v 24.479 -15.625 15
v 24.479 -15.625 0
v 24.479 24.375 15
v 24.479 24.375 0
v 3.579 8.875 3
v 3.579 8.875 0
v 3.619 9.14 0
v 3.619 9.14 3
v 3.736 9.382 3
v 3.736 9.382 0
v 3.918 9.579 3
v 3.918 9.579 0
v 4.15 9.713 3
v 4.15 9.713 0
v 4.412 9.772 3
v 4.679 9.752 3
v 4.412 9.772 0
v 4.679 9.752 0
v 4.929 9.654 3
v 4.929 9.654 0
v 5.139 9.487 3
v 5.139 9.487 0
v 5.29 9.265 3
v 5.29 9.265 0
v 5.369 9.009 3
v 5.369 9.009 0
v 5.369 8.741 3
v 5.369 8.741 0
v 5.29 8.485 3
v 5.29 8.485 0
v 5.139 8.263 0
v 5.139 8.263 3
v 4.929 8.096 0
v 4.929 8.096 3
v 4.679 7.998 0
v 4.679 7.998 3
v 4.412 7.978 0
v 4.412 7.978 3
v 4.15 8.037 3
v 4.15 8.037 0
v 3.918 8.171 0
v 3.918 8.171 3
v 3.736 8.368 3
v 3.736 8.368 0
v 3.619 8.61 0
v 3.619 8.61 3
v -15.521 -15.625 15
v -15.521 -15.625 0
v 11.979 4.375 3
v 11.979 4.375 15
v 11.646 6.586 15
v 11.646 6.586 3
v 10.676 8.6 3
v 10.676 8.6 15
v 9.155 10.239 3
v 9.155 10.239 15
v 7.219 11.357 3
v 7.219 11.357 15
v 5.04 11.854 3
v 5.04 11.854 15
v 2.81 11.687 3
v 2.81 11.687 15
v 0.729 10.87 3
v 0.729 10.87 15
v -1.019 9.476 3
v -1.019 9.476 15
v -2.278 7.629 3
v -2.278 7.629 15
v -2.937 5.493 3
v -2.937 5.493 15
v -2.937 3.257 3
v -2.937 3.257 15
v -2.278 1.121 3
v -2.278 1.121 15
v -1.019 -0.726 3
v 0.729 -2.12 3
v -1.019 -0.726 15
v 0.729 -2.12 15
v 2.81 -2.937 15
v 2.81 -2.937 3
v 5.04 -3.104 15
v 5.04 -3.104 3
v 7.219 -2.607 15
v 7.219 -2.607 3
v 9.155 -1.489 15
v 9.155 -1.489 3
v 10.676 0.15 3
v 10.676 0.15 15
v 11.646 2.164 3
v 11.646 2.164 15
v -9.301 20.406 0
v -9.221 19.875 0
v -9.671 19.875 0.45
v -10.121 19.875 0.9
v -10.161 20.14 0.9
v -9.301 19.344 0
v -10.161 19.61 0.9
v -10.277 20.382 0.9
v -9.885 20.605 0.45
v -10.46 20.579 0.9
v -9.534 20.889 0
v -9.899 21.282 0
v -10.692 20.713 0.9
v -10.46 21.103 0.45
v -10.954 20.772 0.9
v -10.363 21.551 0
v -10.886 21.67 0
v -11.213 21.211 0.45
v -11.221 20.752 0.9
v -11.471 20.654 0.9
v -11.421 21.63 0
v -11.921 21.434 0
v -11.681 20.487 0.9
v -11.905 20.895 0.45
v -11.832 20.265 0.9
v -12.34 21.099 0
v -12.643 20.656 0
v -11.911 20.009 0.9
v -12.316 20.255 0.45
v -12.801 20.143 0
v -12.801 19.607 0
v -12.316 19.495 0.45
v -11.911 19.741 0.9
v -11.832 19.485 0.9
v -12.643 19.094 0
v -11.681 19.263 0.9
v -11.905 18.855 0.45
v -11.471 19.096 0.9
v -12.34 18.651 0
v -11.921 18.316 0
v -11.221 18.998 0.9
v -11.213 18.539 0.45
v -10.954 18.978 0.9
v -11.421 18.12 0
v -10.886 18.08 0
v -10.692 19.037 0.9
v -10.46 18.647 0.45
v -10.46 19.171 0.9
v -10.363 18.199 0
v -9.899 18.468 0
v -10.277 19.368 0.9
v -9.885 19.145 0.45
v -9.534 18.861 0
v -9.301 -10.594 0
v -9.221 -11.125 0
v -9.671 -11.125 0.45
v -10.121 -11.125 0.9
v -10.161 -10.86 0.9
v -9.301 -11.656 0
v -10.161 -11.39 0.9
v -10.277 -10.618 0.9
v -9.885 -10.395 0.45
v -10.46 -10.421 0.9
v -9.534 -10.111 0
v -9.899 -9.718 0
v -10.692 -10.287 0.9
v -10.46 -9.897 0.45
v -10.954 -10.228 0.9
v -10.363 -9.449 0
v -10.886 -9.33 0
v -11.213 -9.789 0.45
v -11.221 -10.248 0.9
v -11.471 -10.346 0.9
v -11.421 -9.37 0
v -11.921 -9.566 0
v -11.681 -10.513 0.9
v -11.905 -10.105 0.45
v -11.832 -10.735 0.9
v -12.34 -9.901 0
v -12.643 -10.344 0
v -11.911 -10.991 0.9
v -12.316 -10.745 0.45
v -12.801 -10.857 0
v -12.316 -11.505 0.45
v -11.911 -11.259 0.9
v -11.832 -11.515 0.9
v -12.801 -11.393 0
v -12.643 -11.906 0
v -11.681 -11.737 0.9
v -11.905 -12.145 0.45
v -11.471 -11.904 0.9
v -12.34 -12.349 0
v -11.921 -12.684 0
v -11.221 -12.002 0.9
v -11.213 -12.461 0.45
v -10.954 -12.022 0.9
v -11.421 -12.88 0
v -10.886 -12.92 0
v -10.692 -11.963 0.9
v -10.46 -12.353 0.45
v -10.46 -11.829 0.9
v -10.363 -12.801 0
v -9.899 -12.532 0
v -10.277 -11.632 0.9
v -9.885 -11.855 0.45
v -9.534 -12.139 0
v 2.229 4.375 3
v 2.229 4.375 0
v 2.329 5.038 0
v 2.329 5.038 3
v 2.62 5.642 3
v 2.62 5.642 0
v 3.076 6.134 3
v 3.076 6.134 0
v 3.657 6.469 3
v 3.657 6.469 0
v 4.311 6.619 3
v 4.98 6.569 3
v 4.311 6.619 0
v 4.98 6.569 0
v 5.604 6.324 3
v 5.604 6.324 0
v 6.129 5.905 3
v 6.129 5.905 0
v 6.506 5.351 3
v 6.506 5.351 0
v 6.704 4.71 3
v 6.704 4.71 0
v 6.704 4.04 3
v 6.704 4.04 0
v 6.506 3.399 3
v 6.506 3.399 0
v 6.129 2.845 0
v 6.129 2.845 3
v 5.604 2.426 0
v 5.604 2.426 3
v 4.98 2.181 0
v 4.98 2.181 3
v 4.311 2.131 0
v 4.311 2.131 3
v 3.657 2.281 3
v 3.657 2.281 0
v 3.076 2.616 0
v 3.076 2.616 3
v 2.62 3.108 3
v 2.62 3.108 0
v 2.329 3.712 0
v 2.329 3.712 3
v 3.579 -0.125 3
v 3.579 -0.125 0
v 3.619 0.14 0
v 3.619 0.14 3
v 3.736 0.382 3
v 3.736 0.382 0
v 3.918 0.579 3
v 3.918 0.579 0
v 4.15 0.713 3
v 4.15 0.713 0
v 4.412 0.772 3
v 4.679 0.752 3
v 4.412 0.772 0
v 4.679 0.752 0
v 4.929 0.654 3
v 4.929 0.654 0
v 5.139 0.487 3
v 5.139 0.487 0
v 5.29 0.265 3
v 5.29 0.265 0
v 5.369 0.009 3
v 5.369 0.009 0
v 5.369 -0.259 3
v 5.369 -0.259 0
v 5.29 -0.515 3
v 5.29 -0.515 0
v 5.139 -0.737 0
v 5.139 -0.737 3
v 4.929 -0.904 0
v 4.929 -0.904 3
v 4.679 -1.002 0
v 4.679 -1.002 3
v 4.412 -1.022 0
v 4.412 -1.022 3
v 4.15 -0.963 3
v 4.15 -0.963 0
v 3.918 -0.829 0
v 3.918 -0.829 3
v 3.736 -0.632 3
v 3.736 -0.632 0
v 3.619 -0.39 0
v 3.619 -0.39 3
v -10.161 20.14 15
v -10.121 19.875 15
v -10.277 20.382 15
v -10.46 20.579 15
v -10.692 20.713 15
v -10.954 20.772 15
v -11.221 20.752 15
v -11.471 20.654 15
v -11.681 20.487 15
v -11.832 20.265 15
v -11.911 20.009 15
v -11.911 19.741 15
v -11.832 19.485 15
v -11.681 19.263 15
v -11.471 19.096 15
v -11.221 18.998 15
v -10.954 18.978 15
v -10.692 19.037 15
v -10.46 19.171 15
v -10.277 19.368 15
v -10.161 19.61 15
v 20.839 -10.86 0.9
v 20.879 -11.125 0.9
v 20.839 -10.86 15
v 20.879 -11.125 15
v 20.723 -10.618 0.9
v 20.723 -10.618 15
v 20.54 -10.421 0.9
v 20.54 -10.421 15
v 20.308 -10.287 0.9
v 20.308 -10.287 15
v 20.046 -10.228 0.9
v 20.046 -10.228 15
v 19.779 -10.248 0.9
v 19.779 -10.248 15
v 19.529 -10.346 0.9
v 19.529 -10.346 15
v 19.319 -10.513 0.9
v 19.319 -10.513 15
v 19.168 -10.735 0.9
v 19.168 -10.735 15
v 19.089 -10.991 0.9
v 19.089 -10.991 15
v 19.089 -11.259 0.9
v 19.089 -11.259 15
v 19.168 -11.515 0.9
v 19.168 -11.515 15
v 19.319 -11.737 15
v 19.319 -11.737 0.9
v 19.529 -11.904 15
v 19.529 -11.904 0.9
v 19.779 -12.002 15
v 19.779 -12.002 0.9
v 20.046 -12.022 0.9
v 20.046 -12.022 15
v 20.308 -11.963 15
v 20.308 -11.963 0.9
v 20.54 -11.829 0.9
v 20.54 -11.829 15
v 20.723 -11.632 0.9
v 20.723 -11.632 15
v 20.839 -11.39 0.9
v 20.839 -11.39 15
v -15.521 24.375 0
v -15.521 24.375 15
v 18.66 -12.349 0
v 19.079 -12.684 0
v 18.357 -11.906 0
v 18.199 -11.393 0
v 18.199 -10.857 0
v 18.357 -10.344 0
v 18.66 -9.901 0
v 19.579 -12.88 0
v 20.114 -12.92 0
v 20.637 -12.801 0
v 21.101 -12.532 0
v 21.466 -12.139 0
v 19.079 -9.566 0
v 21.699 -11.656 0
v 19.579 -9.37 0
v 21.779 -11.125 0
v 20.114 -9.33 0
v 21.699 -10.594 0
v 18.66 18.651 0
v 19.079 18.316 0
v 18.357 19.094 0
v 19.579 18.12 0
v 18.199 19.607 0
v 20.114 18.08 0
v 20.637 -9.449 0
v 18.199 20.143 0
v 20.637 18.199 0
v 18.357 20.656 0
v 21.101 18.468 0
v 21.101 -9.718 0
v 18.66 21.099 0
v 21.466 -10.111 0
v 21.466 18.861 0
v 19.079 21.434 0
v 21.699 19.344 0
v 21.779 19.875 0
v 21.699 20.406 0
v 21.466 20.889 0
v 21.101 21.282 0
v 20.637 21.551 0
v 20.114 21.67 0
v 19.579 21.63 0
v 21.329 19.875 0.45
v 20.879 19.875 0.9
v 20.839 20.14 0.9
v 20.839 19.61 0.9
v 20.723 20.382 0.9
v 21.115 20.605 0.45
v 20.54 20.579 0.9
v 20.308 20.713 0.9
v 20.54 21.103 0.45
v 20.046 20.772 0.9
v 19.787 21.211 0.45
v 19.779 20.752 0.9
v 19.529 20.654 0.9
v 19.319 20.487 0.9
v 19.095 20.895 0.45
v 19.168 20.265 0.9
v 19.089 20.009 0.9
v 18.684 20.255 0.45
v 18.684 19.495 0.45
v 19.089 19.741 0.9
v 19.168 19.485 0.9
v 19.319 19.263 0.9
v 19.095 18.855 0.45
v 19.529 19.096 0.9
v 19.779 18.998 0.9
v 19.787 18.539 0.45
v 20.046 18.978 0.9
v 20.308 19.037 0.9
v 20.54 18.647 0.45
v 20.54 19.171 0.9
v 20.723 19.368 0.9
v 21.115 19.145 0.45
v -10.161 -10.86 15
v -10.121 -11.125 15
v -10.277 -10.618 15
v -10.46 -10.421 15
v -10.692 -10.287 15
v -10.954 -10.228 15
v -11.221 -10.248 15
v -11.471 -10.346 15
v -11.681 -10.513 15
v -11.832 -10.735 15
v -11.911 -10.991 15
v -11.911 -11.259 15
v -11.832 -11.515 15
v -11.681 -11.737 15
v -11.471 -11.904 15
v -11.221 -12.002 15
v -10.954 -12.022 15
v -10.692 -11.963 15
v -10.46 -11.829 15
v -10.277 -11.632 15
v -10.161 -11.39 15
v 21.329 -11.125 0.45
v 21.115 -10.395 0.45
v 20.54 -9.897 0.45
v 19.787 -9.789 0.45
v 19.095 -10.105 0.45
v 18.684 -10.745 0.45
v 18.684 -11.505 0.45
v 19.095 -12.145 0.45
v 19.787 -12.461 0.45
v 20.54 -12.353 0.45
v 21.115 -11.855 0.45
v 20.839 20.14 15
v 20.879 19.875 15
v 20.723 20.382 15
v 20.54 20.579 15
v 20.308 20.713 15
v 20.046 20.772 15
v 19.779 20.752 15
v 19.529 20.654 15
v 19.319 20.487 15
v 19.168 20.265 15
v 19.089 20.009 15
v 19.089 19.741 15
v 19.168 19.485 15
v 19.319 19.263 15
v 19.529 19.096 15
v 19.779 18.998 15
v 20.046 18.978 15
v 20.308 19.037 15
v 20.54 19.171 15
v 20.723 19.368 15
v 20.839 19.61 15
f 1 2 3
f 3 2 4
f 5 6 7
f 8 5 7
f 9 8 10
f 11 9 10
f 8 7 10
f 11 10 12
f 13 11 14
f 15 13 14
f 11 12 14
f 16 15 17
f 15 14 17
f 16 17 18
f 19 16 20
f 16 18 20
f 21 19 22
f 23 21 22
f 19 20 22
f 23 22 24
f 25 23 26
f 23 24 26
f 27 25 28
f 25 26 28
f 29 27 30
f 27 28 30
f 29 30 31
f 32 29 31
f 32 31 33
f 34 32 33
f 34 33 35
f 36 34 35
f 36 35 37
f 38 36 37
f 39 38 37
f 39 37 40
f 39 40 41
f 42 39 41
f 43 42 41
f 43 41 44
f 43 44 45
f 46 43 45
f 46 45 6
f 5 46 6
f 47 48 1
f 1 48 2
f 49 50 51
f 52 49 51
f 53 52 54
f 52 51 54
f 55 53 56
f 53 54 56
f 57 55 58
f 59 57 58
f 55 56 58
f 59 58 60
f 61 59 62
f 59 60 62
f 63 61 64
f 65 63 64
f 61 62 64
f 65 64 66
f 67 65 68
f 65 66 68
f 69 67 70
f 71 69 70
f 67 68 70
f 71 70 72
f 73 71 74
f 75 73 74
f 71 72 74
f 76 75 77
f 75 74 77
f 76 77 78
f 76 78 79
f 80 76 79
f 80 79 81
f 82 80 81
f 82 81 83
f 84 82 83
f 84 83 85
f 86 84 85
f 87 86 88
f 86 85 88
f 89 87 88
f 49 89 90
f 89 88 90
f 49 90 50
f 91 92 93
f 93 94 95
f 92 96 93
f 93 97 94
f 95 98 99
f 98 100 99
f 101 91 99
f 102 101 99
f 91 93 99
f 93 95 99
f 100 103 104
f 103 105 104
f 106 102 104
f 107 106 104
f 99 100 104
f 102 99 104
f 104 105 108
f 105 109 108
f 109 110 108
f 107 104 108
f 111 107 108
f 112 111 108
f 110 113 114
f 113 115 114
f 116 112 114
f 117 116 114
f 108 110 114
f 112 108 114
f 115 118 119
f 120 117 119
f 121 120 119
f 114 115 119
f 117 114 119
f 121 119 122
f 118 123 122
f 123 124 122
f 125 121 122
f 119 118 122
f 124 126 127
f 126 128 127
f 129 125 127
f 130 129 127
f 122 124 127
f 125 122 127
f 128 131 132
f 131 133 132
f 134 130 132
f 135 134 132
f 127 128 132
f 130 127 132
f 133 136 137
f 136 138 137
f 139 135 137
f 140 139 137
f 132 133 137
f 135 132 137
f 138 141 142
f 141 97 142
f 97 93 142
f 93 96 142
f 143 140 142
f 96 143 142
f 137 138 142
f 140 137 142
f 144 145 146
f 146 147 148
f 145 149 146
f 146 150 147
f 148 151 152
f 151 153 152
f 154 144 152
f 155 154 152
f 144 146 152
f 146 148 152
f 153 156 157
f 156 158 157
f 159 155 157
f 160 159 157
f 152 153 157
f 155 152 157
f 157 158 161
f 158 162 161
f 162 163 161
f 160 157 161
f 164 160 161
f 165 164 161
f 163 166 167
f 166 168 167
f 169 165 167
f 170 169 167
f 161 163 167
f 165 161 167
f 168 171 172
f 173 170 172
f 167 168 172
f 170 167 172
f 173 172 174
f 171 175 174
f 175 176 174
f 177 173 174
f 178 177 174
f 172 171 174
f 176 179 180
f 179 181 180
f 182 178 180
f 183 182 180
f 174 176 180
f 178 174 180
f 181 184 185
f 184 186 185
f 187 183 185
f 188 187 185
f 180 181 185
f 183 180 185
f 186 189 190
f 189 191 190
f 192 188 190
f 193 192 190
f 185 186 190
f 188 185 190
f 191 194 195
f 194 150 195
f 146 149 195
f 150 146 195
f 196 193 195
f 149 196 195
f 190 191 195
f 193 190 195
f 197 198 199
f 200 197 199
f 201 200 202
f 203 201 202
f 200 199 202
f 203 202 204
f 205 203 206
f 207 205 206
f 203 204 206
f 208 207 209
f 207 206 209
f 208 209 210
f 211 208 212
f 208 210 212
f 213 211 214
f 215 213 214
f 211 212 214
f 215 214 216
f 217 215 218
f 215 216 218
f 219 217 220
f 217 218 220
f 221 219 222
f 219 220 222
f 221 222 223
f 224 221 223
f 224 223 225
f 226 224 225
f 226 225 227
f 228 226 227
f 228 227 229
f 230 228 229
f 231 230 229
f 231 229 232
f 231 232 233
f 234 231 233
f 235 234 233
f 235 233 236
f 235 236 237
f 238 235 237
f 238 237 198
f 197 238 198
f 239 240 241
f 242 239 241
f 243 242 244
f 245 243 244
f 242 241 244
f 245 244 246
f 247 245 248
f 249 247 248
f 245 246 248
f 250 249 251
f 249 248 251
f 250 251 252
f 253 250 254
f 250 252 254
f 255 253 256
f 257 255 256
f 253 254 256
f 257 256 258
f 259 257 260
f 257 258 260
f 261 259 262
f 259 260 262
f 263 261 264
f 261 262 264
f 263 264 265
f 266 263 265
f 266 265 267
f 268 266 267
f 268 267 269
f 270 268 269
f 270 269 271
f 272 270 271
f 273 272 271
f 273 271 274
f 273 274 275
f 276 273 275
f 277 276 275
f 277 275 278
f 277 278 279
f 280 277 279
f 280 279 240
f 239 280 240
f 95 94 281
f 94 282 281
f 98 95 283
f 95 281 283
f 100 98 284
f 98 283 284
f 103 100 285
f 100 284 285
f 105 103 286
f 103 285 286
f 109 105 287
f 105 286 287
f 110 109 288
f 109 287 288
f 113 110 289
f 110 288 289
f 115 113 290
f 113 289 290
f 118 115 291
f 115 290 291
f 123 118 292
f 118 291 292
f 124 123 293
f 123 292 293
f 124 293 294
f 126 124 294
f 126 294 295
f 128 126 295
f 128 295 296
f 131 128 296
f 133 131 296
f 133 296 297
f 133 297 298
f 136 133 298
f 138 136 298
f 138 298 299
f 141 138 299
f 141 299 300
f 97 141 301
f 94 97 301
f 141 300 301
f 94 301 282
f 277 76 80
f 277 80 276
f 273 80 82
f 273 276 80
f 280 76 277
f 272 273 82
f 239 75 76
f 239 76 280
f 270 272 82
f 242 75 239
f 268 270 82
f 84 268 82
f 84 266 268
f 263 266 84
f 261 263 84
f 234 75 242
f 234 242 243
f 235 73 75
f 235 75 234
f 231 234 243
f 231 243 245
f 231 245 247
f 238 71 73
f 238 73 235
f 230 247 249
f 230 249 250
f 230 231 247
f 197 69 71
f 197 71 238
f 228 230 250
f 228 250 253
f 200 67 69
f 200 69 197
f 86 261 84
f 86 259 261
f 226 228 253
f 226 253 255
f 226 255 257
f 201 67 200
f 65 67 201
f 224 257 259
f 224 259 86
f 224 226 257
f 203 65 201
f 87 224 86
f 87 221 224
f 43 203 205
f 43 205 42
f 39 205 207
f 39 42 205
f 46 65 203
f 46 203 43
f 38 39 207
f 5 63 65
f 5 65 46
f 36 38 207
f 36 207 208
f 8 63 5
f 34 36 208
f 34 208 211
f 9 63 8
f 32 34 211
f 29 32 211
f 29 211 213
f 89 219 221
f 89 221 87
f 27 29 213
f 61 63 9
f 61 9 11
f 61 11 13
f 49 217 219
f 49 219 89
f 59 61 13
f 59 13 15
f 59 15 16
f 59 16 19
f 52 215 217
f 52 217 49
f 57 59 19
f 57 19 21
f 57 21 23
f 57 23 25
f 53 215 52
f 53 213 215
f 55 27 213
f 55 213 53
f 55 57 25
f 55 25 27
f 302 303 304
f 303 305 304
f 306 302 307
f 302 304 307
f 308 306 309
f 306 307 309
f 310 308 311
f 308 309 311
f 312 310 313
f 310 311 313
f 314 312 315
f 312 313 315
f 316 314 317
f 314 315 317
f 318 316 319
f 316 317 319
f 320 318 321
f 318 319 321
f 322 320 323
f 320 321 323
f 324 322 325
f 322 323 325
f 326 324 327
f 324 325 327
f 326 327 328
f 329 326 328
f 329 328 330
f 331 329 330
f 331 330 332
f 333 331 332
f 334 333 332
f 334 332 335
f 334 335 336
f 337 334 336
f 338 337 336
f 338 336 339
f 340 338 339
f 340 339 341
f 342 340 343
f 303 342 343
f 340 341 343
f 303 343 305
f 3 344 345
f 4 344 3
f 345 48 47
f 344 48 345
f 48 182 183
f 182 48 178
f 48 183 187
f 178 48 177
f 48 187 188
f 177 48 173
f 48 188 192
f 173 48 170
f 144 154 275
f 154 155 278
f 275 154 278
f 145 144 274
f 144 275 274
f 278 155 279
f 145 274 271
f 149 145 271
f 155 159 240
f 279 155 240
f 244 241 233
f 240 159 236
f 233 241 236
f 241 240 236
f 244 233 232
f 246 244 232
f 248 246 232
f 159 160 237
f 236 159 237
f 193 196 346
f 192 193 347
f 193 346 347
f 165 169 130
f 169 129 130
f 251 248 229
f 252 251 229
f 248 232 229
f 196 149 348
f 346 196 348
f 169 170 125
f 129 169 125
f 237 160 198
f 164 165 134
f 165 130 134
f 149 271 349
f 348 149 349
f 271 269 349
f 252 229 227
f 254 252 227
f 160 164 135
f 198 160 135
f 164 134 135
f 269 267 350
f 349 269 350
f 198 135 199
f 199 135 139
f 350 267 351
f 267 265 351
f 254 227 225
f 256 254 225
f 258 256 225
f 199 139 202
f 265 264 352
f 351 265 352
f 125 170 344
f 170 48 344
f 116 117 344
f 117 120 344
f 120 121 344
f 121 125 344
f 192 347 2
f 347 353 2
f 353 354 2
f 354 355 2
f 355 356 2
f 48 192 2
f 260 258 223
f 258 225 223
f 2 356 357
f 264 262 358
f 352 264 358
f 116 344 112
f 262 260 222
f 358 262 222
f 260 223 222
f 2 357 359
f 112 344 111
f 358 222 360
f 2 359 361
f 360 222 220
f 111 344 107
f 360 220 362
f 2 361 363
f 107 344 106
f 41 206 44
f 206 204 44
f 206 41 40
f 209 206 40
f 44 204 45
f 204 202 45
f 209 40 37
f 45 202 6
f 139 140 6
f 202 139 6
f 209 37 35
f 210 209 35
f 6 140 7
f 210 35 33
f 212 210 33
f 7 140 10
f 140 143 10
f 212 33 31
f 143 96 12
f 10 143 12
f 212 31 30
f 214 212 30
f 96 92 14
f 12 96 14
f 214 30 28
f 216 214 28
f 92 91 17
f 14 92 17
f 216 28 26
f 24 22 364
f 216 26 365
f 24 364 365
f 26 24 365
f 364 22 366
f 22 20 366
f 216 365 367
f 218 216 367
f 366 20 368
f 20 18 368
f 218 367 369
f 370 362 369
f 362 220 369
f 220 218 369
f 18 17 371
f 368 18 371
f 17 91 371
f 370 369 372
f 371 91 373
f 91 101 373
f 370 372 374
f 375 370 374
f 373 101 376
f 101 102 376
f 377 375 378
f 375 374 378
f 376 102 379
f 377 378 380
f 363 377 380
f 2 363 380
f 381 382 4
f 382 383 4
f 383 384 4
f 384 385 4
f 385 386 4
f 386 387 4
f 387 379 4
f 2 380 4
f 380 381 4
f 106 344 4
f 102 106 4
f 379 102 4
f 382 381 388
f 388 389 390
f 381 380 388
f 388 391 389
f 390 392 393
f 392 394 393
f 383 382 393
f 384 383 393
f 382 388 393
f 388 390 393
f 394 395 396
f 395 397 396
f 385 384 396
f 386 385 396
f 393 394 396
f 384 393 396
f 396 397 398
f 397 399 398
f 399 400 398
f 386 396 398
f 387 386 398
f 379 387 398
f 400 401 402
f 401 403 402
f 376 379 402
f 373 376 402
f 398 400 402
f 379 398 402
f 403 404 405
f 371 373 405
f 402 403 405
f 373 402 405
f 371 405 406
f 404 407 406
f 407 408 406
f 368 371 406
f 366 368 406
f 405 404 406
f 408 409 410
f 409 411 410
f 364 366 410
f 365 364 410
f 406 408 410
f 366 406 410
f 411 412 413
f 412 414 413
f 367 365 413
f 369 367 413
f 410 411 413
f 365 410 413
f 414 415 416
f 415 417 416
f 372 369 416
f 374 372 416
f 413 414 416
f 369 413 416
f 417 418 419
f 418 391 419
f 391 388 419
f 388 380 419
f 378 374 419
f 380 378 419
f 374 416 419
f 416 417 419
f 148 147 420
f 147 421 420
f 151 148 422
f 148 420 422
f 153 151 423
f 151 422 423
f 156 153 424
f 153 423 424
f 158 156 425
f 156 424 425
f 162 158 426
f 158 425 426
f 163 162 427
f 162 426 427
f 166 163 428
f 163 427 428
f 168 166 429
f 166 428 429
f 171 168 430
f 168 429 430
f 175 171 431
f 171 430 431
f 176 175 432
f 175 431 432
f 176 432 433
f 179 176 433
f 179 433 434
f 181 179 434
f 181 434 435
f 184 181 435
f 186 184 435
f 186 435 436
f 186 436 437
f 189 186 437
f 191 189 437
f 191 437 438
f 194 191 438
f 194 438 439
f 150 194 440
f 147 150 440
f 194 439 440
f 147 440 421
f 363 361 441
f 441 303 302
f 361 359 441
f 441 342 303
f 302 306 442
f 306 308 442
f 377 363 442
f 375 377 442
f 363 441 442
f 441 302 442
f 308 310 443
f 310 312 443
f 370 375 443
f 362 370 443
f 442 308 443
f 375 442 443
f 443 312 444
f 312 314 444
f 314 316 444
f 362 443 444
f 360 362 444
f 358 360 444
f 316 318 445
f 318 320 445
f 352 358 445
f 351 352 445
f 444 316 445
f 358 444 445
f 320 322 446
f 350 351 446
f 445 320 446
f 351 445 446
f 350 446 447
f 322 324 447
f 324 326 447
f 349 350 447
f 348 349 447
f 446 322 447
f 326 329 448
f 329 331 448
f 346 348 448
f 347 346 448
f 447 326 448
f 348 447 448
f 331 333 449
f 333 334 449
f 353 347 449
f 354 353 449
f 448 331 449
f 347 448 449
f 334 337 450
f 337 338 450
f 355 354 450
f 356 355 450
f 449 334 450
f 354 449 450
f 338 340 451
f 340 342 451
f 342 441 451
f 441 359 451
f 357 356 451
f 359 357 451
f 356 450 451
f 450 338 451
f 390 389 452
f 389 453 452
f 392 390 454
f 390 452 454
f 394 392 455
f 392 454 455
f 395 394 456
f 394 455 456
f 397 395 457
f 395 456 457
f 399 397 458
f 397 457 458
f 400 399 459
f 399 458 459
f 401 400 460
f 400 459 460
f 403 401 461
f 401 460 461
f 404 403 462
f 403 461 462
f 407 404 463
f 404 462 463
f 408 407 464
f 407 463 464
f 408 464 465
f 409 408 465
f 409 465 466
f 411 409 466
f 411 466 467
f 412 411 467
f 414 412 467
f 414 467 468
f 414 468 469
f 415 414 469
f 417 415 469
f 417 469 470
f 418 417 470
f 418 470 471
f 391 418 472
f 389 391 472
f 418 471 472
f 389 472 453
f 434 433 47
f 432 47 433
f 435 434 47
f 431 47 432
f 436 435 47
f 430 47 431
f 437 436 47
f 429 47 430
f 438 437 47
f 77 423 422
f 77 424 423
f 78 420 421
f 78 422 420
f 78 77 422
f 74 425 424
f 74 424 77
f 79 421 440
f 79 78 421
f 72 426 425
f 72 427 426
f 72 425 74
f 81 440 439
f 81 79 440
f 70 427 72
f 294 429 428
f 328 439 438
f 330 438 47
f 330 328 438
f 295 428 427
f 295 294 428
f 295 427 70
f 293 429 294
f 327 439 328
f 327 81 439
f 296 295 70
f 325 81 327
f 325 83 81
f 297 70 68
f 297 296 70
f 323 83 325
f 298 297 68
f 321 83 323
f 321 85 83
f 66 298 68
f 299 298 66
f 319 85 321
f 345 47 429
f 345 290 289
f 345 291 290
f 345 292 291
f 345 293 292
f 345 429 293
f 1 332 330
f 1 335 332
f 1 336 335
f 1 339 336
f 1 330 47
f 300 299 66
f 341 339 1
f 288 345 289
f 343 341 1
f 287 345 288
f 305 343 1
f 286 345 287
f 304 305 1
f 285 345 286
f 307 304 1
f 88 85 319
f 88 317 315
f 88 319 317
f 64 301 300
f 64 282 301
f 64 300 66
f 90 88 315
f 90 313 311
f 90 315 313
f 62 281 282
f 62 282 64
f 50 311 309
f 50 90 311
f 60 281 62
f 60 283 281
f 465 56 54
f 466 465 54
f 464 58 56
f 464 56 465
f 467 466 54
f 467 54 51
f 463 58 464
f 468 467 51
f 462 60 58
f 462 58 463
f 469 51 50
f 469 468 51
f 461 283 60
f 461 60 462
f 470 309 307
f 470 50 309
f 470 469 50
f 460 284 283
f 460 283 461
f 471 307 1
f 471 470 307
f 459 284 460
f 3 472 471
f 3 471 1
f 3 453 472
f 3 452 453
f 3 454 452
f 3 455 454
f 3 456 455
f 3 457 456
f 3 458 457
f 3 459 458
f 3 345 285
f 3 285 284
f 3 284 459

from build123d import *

# Parameters (mm, degrees)
SKIZZE1_W                                            = 40
SKIZZE1_H                                            = 40
AUFSATZ_LINEAR_AUSTRAGEN1_DEPTH                      = 15
SKIZZE3_R                                            = 7.5
SCHNITT_LINEAR_AUSTRAGEN1_DEPTH                      = 12
DURCHGANGSLOCH_F_R_M41_D                             = 4.5
DURCHGANGSLOCH_F_R_M1_61_D                           = 1.8
FORMSENKUNG_F_R_M1_6_SENKSCHRAUBE_MIT_SC_D           = 1.8
FORMSENKUNG_F_R_M1_6_SENKSCHRAUBE_MIT_SC_CSINK_D     = 3.6
FORMSENKUNG_F_R_M1_6_SENKSCHRAUBE_MIT_SC_CSINK_ANGLE = 90


with BuildPart() as part:
    # Skizze1 → Aufsatz-Linear austragen1 (new body)
    with BuildSketch(Plane.XY):
        with Locations((4.479166667, 4.375)):
            Rectangle(SKIZZE1_W, SKIZZE1_H)
    extrude(amount=AUFSATZ_LINEAR_AUSTRAGEN1_DEPTH)

    # Skizze3 → Schnitt-Linear austragen1 (cut)
    with BuildSketch(Plane.XY.offset(15)):
        with Locations((4.479166667, 4.375)):
            Circle(SKIZZE3_R)
    extrude(amount=-SCHNITT_LINEAR_AUSTRAGEN1_DEPTH, mode=Mode.SUBTRACT)

    # Durchgangsloch für M41 (through all)
    with Locations(Plane.XY.offset(3)):
        with Locations((4.479166667, 4.375)):
            Hole(DURCHGANGSLOCH_F_R_M41_D / 2)

    # Durchgangsloch für M1.61 (through all)
    with Locations(Plane.XY.offset(3)):
        with Locations((4.479166667, 8.875), (4.479166667, -0.125)):
            Hole(DURCHGANGSLOCH_F_R_M1_61_D / 2)

    # Formsenkung für M1.6 Senkschraube mit Schlitz/Kreuzschlitz1 (through all)
    with Locations(Plane(origin=(0, 0, 0), x_dir=(-1, 0, 0), z_dir=(0, 0, -1))):
        with Locations((-19.979166667, 19.875), (11.020833333, 19.875), (11.020833333, -11.125), (-19.979166667, -11.125)):
            CounterSinkHole(FORMSENKUNG_F_R_M1_6_SENKSCHRAUBE_MIT_SC_D / 2, FORMSENKUNG_F_R_M1_6_SENKSCHRAUBE_MIT_SC_CSINK_D / 2, counter_sink_angle=FORMSENKUNG_F_R_M1_6_SENKSCHRAUBE_MIT_SC_CSINK_ANGLE)


solid = part.part
